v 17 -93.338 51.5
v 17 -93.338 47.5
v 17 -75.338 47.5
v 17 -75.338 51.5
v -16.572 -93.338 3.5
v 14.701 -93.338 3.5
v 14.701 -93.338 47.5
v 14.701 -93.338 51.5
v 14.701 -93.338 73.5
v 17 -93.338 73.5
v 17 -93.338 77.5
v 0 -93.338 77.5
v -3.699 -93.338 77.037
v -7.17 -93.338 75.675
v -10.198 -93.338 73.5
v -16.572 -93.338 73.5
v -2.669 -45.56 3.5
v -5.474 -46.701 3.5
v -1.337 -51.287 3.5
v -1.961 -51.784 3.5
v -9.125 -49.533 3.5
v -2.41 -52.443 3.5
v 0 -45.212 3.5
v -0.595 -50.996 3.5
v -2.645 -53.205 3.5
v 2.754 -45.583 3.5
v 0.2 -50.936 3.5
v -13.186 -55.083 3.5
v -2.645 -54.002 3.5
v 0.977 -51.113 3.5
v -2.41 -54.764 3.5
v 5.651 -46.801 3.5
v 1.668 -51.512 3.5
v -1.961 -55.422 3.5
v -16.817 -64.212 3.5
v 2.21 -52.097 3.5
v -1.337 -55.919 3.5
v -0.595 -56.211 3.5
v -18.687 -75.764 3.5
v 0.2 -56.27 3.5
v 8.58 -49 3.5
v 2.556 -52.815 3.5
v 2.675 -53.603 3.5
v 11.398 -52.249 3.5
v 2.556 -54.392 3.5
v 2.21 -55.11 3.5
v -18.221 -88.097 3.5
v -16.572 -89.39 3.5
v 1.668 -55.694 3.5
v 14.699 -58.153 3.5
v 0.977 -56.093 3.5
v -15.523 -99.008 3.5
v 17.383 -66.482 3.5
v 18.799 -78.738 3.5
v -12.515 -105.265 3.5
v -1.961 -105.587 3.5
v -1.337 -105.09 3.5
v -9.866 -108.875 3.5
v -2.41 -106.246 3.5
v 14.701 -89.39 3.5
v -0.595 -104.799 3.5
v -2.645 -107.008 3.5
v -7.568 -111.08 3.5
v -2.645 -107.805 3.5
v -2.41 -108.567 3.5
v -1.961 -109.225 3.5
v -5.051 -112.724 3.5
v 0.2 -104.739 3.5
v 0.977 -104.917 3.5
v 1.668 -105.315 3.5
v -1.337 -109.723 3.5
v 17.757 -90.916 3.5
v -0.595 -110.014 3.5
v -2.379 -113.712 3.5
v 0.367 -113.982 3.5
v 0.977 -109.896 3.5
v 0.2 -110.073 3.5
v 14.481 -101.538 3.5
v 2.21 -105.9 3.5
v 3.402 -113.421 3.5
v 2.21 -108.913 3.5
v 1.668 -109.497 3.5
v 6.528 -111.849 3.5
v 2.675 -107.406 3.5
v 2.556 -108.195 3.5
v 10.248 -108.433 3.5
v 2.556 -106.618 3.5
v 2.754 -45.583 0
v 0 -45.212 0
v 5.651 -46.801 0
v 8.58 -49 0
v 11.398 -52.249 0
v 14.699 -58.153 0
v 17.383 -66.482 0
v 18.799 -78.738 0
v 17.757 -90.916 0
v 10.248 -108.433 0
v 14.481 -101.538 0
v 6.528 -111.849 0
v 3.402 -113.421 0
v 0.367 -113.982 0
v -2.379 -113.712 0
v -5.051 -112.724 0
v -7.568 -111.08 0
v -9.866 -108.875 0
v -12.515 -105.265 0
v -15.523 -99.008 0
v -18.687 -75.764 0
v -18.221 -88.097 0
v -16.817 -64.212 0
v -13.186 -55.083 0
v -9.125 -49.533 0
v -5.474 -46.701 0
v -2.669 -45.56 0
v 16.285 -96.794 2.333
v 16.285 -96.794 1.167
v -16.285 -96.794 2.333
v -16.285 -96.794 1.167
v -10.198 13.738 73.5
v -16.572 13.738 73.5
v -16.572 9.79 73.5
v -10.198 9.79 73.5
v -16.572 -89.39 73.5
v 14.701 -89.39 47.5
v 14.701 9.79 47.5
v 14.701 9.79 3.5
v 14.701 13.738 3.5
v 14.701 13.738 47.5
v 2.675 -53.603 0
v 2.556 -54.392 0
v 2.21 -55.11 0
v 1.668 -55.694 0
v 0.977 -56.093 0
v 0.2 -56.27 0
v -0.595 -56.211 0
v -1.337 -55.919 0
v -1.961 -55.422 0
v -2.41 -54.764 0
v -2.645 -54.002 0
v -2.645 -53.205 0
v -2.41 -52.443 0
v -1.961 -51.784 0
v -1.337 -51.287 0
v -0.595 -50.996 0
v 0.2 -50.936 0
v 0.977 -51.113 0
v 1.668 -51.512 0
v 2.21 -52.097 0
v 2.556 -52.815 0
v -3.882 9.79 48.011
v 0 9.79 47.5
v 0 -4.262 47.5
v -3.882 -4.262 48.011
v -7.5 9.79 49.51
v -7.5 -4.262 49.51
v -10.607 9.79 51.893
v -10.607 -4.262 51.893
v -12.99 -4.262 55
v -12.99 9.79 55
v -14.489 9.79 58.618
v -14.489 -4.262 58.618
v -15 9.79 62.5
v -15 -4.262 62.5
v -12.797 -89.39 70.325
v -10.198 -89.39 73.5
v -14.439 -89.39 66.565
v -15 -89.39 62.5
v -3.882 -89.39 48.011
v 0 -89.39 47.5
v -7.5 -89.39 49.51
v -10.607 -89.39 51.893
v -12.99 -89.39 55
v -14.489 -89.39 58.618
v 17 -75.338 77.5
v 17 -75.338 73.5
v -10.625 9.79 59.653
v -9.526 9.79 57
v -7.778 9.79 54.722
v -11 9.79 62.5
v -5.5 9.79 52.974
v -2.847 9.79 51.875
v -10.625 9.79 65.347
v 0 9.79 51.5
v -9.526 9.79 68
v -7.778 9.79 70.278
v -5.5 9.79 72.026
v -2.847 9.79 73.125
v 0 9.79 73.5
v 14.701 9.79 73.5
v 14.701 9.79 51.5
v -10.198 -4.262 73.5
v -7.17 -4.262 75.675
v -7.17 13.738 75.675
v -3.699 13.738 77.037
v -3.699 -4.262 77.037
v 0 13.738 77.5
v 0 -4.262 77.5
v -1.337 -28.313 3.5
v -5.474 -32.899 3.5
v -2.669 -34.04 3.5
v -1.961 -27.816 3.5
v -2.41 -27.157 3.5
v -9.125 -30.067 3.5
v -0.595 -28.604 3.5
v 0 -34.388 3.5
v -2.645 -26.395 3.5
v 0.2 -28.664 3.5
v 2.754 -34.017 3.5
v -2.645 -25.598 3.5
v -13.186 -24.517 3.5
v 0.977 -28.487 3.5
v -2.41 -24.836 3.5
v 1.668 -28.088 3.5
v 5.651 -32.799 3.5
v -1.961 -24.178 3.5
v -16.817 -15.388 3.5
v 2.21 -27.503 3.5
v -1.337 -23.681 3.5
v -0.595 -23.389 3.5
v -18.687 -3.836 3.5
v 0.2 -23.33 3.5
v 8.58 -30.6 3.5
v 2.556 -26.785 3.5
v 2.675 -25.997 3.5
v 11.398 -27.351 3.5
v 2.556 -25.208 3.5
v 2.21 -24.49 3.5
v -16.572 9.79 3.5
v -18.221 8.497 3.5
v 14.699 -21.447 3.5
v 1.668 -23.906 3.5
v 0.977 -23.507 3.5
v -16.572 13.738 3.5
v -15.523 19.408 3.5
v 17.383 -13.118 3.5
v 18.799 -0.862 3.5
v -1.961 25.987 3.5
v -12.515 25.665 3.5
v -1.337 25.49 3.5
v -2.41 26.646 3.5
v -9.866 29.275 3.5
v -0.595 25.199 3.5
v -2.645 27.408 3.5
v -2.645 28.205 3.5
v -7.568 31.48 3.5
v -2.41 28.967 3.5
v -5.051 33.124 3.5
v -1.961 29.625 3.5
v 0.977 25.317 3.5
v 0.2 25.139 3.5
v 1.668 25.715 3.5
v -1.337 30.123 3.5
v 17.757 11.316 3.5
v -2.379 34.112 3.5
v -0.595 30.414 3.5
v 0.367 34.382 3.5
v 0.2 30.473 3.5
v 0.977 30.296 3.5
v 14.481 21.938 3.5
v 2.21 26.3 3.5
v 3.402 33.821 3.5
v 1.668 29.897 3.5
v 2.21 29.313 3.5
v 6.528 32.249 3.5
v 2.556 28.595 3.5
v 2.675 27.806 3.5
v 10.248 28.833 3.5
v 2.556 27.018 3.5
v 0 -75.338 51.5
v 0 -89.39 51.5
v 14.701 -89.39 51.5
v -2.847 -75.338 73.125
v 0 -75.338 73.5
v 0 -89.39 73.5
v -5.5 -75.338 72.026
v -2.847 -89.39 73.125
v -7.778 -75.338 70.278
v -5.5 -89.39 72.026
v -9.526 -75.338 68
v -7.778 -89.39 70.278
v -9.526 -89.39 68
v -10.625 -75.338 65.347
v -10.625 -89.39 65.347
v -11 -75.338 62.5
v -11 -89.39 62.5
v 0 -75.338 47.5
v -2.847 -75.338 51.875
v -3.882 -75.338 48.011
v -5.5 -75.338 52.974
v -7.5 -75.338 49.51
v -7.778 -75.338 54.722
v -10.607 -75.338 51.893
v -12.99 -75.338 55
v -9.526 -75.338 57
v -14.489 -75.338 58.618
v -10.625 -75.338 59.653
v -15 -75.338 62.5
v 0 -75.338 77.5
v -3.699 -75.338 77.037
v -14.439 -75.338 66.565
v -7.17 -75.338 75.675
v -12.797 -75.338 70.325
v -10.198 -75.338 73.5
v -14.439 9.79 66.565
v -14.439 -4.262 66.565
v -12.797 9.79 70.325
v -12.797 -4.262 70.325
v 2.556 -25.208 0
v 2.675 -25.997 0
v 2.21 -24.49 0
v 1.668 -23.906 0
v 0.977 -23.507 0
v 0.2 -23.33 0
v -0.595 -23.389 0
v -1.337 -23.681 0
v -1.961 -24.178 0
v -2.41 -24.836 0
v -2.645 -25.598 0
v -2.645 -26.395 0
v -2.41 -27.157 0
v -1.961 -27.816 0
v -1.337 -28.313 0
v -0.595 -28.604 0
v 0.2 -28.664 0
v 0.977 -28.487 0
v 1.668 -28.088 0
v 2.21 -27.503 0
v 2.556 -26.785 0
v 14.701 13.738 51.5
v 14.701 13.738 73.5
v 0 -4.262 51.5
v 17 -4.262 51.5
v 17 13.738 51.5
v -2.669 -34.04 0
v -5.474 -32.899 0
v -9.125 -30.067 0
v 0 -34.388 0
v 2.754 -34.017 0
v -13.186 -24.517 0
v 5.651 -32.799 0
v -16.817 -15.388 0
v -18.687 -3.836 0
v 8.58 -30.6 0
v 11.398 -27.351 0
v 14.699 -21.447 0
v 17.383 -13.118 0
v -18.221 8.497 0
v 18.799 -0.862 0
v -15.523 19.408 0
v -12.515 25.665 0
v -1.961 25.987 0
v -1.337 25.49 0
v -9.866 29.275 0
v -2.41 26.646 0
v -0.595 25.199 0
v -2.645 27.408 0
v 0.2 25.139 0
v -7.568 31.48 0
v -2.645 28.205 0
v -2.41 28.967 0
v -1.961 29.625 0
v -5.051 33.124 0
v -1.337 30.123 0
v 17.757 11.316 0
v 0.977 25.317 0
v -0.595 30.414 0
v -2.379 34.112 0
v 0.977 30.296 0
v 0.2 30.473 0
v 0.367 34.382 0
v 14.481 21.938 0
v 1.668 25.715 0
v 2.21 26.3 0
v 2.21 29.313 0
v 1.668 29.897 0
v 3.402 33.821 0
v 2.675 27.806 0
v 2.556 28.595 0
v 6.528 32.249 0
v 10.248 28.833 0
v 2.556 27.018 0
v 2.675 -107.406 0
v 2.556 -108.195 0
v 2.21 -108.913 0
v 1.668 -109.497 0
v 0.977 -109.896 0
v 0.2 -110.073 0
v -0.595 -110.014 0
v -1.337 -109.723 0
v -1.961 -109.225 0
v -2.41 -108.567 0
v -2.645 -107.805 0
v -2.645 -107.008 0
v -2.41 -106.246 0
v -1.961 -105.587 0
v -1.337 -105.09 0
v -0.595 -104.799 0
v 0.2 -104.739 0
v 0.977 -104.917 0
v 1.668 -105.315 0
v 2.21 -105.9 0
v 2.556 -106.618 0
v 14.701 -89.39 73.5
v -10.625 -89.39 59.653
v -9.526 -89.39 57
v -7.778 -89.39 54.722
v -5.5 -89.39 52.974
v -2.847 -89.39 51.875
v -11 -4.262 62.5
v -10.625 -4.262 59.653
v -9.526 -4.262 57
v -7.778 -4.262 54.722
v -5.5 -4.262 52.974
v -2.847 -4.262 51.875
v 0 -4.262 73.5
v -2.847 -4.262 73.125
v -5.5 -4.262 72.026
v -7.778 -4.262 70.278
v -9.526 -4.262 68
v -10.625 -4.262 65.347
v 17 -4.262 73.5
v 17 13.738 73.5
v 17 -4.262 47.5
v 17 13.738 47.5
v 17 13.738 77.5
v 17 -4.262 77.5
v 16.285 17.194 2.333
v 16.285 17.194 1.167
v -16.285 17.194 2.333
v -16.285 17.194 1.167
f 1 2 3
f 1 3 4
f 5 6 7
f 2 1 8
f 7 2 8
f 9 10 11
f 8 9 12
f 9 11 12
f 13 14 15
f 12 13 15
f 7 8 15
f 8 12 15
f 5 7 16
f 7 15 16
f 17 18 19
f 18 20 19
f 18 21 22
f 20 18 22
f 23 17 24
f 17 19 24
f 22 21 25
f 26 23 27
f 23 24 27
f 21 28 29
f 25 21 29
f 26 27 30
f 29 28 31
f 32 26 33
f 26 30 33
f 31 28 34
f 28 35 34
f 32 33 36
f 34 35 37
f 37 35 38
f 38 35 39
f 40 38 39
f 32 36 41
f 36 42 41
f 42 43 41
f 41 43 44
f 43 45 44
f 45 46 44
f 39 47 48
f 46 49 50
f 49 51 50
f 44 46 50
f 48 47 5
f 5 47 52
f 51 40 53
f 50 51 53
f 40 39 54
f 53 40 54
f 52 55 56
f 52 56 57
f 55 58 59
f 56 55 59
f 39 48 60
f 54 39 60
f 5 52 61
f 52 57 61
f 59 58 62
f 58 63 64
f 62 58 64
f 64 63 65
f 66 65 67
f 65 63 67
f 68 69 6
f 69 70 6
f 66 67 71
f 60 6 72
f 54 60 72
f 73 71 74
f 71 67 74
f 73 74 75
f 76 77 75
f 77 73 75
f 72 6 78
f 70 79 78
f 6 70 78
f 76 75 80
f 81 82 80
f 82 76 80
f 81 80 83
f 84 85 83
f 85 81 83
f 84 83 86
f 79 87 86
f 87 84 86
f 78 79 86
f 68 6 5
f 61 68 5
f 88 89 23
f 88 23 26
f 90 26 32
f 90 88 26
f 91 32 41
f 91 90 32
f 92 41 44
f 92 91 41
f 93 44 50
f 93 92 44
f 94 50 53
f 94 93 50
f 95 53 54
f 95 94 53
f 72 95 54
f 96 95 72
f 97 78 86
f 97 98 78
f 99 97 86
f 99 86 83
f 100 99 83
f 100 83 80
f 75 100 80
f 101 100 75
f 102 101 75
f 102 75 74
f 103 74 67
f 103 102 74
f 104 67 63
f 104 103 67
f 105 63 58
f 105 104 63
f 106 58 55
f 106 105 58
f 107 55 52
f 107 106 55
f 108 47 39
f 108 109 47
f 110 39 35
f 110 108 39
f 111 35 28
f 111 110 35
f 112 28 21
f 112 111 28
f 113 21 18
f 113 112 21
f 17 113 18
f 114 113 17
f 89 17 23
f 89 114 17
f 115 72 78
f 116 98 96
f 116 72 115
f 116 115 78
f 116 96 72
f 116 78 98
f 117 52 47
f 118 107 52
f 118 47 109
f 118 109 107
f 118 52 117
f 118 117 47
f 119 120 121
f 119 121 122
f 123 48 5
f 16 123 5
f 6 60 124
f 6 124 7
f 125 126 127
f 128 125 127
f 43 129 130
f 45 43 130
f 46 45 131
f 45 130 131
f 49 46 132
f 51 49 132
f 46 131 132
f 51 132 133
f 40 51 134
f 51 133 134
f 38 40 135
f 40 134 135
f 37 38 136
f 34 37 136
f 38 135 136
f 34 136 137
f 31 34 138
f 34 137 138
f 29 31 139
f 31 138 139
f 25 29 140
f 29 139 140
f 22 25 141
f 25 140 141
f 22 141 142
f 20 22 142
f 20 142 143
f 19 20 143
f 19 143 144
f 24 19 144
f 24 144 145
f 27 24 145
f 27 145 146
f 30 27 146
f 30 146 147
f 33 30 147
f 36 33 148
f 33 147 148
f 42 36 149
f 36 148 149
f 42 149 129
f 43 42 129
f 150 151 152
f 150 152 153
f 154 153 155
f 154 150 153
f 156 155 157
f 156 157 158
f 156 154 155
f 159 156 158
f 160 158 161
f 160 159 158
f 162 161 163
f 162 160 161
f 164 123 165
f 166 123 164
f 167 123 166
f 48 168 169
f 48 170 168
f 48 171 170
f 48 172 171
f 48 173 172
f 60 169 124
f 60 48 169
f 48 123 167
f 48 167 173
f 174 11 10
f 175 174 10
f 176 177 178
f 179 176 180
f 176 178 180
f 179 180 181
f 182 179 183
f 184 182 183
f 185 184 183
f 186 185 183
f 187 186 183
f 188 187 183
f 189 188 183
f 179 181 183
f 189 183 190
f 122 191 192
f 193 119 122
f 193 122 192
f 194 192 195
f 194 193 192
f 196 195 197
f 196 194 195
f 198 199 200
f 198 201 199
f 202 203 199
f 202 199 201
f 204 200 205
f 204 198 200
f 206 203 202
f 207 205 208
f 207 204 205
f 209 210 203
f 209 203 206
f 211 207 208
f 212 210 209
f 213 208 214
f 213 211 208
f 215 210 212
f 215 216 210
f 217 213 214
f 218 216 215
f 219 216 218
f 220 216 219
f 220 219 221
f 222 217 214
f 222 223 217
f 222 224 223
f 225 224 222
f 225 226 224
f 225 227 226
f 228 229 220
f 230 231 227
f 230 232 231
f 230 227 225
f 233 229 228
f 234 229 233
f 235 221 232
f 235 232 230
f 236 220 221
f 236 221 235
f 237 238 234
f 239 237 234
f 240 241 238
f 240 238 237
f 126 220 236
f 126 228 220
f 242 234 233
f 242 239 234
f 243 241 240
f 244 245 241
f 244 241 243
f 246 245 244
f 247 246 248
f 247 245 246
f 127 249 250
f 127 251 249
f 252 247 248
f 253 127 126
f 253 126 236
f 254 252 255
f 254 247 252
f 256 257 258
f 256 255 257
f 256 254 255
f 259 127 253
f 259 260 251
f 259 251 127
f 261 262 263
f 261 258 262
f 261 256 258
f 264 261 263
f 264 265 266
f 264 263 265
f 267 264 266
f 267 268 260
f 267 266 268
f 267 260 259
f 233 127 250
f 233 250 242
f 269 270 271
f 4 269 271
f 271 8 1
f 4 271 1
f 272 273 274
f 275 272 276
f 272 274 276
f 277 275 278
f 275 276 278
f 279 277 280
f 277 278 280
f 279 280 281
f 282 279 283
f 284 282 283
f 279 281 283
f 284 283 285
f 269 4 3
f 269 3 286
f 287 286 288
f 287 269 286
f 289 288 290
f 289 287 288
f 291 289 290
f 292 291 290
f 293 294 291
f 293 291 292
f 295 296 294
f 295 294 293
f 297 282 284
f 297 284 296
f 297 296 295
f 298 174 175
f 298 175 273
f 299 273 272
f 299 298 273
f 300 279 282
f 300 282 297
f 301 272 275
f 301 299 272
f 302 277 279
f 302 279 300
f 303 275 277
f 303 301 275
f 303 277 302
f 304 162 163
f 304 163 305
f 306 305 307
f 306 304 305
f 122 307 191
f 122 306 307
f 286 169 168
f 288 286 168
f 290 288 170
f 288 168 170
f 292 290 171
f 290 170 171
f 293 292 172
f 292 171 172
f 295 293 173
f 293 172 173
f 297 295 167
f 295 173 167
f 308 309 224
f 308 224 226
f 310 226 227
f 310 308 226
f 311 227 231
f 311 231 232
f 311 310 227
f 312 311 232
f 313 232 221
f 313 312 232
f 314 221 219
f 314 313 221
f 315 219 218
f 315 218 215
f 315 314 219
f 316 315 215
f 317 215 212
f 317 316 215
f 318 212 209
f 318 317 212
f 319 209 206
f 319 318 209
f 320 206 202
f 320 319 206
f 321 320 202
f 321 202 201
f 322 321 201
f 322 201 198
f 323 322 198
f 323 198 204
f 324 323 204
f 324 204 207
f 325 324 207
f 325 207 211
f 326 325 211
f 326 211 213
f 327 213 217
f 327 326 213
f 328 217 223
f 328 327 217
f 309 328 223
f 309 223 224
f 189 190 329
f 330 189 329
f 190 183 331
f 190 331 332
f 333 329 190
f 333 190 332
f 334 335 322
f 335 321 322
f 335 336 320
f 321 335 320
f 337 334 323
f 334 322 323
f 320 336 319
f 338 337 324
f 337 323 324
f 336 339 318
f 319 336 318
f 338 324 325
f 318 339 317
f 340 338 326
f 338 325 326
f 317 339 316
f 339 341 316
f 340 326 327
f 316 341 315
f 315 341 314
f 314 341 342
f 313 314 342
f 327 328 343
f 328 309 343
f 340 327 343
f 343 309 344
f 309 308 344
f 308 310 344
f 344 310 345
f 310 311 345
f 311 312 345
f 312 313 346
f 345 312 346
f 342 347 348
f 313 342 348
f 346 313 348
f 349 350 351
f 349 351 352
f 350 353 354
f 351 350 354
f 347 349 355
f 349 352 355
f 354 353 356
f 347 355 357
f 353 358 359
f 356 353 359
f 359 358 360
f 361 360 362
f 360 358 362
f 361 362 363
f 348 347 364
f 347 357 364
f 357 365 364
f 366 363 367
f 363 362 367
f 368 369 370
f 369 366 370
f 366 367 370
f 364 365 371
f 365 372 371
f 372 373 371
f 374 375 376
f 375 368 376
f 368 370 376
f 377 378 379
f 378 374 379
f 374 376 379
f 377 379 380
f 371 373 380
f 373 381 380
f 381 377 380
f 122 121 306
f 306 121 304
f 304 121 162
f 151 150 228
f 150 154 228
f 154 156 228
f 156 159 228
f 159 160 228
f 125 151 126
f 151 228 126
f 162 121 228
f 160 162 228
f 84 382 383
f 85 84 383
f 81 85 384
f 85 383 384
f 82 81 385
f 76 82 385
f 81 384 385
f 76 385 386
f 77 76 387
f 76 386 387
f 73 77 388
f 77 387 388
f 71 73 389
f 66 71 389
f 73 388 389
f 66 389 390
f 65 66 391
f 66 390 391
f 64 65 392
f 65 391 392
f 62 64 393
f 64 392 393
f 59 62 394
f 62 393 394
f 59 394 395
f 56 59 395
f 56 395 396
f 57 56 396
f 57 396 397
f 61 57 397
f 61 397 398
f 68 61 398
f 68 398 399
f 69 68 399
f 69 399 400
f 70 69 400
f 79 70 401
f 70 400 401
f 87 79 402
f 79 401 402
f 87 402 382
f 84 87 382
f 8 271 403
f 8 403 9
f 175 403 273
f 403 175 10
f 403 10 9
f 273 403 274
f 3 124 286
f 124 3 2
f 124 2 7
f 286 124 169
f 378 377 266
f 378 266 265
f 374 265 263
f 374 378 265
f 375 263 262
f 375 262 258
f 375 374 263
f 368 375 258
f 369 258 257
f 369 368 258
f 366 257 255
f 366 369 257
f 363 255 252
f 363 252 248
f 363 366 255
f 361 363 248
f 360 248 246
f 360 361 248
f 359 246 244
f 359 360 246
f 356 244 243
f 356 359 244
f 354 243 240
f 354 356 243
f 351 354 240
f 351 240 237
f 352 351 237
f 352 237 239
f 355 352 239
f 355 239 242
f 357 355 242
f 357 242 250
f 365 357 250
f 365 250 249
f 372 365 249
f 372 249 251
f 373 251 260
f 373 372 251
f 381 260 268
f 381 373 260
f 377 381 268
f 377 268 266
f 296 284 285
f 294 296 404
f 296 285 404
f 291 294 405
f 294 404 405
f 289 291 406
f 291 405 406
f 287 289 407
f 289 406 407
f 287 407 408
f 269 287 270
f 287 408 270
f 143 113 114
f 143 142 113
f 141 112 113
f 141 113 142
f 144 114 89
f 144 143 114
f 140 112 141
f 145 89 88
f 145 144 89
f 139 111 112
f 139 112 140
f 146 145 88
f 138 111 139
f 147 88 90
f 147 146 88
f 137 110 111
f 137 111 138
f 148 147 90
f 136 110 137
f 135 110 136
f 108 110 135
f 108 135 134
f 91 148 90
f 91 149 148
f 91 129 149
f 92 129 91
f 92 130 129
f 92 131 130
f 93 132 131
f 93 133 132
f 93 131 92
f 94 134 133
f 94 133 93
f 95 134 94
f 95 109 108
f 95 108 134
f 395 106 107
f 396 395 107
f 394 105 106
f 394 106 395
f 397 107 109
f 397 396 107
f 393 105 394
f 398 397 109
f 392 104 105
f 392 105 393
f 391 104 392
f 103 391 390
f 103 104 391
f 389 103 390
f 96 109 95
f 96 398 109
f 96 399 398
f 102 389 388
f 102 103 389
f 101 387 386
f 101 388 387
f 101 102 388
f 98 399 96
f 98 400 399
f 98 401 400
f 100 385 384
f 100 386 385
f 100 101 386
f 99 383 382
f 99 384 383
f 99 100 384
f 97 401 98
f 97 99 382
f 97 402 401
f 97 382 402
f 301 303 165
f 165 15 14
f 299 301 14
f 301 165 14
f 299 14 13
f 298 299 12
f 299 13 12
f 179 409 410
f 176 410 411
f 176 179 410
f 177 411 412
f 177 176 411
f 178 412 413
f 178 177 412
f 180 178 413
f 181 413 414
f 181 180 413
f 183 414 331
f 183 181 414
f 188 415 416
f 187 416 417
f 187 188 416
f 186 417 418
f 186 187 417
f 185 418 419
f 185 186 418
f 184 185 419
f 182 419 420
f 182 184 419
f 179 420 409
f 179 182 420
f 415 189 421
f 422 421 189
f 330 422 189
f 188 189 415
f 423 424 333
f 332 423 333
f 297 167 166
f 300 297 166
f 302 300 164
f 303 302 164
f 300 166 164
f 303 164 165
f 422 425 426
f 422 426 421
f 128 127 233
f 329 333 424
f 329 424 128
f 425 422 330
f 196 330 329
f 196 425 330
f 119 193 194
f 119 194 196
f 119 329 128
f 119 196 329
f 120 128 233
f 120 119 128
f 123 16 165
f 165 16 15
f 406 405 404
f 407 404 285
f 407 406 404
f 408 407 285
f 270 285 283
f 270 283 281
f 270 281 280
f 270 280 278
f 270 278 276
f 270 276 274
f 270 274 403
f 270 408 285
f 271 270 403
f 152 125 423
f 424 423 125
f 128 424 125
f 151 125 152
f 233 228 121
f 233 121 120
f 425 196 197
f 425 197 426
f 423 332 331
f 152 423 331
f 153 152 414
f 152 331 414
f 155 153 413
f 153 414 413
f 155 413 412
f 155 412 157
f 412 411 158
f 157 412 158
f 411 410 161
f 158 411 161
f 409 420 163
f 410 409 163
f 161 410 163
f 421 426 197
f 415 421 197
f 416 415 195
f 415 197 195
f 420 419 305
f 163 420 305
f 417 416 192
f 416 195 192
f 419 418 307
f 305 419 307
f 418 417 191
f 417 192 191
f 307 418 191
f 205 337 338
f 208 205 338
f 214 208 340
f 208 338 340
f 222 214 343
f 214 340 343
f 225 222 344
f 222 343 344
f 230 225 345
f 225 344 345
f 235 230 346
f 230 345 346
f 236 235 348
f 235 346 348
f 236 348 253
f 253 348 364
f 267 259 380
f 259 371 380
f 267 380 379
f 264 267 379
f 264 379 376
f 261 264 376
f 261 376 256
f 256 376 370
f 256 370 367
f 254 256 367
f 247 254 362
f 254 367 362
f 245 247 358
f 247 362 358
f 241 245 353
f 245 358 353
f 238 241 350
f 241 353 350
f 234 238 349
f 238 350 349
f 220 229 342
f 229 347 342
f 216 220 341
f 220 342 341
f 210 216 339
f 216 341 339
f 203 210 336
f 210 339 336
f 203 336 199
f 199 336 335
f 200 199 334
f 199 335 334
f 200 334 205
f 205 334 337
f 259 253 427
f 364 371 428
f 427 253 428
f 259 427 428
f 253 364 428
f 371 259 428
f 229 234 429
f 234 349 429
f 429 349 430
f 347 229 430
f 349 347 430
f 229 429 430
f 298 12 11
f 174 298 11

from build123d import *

# Parameters (mm, degrees)
F0_R     = 2.6746278755
F0_W     = 14.561378397
F0_H     = 22.9526823387
F1_DEPTH = 3.5
F2_W     = 31.2729449943
F2_H     = 3.9488486946
F3_DEPTH = 70
F4_W     = 2.2990340441
F4_H     = 4
F5_DEPTH = 18


with BuildPart() as f1:
    # F0 (on Top) → F1 (new body)
    with BuildSketch(Plane.XY):
        with BuildLine():
            add(Edge.make_bspline(
                [(0, -34.388102591), (32.5703019708, -34.388102591), (16.2851509854, 17.1940512955), (0, 68.7762051821), (-16.2851509854, 17.1940512955), (-32.5703019708, -34.388102591), (0, -34.388102591)],
                knots=[0, 0, 0, 2.0943951024, 2.0943951024, 4.1887902048, 4.1887902048, 6.2831853072, 6.2831853072, 6.2831853072], degree=2, weights=[1, 0.5, 1, 0.5, 1, 0.5, 1]))
        make_face()
        with Locations((0, -25.9967967868)):
            Circle(F0_R, mode=Mode.SUBTRACT)
        with Locations((0.5992683582, -3.6611226387)):
            Rectangle(F0_W, F0_H, mode=Mode.SUBTRACT)
        with Locations((0, 27.8062652797)):
            Circle(F0_R, mode=Mode.SUBTRACT)
        with Locations((0.5992683582, -3.6611226387)):
            Rectangle(F0_W, F0_H)
    extrude(amount=F1_DEPTH)

    # F2 (on face) → F3 (join)
    with BuildSketch(Plane.XY.offset(3.5)):
        with Locations((-0.9355065413, 11.7640672252)):
            Rectangle(F2_W, F2_H)
    extrude(amount=F3_DEPTH)

    # F4 (on face) → F5 (join)
    with BuildSketch(Plane(origin=(0, 13.7384915724, 0), x_dir=(-1, 0, 0), z_dir=(0, 1, 0))):
        with BuildLine():
            Line((-10.1980390272, 73.5), (3.87e-08, 73.5))
            Line((3.87e-08, 73.5), (0.9355065413, 73.5))
            Line((0.9355065413, 73.5), (10.1980390272, 73.5))
            ThreePointArc((10.1980390272, 73.5), (5.4772255751, 76.4642400438), (0, 77.5))
            ThreePointArc((0, 77.5), (-5.4772255751, 76.4642400438), (-10.1980390272, 73.5))
        make_face()
        with BuildLine():
            Line((-14.7009659559, 73.5), (-10.1980390272, 73.5))
            ThreePointArc((-10.1980390272, 73.5), (-5.4772255751, 76.4642400438), (0, 77.5))
            Line((0, 77.5), (-17, 77.5))
            Line((-17, 77.5), (-17, 73.5))
            Line((-17, 73.5), (-14.7009659559, 73.5))
        make_face()
        with Locations((-15.8504829779, 49.5)):
            Rectangle(F4_W, F4_H)
        with BuildLine():
            ThreePointArc((0, 47.5), (-5.4772255751, 48.5357599562), (-10.1980390272, 51.5))
            Line((-10.1980390272, 51.5), (-14.7009659559, 51.5))
            Line((-14.7009659559, 51.5), (-14.7009659559, 47.5))
            Line((-14.7009659559, 47.5), (0, 47.5))
        make_face()
        with BuildLine():
            ThreePointArc((11, 62.5), (7.7781745931, 54.7218254069), (0, 51.5))
            Line((0, 51.5), (-10.1980390272, 51.5))
            ThreePointArc((-10.1980390272, 51.5), (-5.4772255751, 48.5357599562), (0, 47.5))
            ThreePointArc((0, 47.5), (10.6066017178, 51.8933982822), (15, 62.5))
            ThreePointArc((15, 62.5), (13.7471921753, 68.5012254829), (10.1980390272, 73.5))
            Line((10.1980390272, 73.5), (0.9355065413, 73.5))
            Line((0.9355065413, 73.5), (3.87e-08, 73.5))
            ThreePointArc((3.87e-08, 73.5), (7.7781746067, 70.2781745794), (11, 62.5))
        make_face()
    extrude(amount=-F5_DEPTH)


with BuildPart() as f7_1:
    # F7: instance of F1
    add(f1.part.mirror(Plane.XZ.offset(39.8)))


solid = Compound([f1.part, f7_1.part])
